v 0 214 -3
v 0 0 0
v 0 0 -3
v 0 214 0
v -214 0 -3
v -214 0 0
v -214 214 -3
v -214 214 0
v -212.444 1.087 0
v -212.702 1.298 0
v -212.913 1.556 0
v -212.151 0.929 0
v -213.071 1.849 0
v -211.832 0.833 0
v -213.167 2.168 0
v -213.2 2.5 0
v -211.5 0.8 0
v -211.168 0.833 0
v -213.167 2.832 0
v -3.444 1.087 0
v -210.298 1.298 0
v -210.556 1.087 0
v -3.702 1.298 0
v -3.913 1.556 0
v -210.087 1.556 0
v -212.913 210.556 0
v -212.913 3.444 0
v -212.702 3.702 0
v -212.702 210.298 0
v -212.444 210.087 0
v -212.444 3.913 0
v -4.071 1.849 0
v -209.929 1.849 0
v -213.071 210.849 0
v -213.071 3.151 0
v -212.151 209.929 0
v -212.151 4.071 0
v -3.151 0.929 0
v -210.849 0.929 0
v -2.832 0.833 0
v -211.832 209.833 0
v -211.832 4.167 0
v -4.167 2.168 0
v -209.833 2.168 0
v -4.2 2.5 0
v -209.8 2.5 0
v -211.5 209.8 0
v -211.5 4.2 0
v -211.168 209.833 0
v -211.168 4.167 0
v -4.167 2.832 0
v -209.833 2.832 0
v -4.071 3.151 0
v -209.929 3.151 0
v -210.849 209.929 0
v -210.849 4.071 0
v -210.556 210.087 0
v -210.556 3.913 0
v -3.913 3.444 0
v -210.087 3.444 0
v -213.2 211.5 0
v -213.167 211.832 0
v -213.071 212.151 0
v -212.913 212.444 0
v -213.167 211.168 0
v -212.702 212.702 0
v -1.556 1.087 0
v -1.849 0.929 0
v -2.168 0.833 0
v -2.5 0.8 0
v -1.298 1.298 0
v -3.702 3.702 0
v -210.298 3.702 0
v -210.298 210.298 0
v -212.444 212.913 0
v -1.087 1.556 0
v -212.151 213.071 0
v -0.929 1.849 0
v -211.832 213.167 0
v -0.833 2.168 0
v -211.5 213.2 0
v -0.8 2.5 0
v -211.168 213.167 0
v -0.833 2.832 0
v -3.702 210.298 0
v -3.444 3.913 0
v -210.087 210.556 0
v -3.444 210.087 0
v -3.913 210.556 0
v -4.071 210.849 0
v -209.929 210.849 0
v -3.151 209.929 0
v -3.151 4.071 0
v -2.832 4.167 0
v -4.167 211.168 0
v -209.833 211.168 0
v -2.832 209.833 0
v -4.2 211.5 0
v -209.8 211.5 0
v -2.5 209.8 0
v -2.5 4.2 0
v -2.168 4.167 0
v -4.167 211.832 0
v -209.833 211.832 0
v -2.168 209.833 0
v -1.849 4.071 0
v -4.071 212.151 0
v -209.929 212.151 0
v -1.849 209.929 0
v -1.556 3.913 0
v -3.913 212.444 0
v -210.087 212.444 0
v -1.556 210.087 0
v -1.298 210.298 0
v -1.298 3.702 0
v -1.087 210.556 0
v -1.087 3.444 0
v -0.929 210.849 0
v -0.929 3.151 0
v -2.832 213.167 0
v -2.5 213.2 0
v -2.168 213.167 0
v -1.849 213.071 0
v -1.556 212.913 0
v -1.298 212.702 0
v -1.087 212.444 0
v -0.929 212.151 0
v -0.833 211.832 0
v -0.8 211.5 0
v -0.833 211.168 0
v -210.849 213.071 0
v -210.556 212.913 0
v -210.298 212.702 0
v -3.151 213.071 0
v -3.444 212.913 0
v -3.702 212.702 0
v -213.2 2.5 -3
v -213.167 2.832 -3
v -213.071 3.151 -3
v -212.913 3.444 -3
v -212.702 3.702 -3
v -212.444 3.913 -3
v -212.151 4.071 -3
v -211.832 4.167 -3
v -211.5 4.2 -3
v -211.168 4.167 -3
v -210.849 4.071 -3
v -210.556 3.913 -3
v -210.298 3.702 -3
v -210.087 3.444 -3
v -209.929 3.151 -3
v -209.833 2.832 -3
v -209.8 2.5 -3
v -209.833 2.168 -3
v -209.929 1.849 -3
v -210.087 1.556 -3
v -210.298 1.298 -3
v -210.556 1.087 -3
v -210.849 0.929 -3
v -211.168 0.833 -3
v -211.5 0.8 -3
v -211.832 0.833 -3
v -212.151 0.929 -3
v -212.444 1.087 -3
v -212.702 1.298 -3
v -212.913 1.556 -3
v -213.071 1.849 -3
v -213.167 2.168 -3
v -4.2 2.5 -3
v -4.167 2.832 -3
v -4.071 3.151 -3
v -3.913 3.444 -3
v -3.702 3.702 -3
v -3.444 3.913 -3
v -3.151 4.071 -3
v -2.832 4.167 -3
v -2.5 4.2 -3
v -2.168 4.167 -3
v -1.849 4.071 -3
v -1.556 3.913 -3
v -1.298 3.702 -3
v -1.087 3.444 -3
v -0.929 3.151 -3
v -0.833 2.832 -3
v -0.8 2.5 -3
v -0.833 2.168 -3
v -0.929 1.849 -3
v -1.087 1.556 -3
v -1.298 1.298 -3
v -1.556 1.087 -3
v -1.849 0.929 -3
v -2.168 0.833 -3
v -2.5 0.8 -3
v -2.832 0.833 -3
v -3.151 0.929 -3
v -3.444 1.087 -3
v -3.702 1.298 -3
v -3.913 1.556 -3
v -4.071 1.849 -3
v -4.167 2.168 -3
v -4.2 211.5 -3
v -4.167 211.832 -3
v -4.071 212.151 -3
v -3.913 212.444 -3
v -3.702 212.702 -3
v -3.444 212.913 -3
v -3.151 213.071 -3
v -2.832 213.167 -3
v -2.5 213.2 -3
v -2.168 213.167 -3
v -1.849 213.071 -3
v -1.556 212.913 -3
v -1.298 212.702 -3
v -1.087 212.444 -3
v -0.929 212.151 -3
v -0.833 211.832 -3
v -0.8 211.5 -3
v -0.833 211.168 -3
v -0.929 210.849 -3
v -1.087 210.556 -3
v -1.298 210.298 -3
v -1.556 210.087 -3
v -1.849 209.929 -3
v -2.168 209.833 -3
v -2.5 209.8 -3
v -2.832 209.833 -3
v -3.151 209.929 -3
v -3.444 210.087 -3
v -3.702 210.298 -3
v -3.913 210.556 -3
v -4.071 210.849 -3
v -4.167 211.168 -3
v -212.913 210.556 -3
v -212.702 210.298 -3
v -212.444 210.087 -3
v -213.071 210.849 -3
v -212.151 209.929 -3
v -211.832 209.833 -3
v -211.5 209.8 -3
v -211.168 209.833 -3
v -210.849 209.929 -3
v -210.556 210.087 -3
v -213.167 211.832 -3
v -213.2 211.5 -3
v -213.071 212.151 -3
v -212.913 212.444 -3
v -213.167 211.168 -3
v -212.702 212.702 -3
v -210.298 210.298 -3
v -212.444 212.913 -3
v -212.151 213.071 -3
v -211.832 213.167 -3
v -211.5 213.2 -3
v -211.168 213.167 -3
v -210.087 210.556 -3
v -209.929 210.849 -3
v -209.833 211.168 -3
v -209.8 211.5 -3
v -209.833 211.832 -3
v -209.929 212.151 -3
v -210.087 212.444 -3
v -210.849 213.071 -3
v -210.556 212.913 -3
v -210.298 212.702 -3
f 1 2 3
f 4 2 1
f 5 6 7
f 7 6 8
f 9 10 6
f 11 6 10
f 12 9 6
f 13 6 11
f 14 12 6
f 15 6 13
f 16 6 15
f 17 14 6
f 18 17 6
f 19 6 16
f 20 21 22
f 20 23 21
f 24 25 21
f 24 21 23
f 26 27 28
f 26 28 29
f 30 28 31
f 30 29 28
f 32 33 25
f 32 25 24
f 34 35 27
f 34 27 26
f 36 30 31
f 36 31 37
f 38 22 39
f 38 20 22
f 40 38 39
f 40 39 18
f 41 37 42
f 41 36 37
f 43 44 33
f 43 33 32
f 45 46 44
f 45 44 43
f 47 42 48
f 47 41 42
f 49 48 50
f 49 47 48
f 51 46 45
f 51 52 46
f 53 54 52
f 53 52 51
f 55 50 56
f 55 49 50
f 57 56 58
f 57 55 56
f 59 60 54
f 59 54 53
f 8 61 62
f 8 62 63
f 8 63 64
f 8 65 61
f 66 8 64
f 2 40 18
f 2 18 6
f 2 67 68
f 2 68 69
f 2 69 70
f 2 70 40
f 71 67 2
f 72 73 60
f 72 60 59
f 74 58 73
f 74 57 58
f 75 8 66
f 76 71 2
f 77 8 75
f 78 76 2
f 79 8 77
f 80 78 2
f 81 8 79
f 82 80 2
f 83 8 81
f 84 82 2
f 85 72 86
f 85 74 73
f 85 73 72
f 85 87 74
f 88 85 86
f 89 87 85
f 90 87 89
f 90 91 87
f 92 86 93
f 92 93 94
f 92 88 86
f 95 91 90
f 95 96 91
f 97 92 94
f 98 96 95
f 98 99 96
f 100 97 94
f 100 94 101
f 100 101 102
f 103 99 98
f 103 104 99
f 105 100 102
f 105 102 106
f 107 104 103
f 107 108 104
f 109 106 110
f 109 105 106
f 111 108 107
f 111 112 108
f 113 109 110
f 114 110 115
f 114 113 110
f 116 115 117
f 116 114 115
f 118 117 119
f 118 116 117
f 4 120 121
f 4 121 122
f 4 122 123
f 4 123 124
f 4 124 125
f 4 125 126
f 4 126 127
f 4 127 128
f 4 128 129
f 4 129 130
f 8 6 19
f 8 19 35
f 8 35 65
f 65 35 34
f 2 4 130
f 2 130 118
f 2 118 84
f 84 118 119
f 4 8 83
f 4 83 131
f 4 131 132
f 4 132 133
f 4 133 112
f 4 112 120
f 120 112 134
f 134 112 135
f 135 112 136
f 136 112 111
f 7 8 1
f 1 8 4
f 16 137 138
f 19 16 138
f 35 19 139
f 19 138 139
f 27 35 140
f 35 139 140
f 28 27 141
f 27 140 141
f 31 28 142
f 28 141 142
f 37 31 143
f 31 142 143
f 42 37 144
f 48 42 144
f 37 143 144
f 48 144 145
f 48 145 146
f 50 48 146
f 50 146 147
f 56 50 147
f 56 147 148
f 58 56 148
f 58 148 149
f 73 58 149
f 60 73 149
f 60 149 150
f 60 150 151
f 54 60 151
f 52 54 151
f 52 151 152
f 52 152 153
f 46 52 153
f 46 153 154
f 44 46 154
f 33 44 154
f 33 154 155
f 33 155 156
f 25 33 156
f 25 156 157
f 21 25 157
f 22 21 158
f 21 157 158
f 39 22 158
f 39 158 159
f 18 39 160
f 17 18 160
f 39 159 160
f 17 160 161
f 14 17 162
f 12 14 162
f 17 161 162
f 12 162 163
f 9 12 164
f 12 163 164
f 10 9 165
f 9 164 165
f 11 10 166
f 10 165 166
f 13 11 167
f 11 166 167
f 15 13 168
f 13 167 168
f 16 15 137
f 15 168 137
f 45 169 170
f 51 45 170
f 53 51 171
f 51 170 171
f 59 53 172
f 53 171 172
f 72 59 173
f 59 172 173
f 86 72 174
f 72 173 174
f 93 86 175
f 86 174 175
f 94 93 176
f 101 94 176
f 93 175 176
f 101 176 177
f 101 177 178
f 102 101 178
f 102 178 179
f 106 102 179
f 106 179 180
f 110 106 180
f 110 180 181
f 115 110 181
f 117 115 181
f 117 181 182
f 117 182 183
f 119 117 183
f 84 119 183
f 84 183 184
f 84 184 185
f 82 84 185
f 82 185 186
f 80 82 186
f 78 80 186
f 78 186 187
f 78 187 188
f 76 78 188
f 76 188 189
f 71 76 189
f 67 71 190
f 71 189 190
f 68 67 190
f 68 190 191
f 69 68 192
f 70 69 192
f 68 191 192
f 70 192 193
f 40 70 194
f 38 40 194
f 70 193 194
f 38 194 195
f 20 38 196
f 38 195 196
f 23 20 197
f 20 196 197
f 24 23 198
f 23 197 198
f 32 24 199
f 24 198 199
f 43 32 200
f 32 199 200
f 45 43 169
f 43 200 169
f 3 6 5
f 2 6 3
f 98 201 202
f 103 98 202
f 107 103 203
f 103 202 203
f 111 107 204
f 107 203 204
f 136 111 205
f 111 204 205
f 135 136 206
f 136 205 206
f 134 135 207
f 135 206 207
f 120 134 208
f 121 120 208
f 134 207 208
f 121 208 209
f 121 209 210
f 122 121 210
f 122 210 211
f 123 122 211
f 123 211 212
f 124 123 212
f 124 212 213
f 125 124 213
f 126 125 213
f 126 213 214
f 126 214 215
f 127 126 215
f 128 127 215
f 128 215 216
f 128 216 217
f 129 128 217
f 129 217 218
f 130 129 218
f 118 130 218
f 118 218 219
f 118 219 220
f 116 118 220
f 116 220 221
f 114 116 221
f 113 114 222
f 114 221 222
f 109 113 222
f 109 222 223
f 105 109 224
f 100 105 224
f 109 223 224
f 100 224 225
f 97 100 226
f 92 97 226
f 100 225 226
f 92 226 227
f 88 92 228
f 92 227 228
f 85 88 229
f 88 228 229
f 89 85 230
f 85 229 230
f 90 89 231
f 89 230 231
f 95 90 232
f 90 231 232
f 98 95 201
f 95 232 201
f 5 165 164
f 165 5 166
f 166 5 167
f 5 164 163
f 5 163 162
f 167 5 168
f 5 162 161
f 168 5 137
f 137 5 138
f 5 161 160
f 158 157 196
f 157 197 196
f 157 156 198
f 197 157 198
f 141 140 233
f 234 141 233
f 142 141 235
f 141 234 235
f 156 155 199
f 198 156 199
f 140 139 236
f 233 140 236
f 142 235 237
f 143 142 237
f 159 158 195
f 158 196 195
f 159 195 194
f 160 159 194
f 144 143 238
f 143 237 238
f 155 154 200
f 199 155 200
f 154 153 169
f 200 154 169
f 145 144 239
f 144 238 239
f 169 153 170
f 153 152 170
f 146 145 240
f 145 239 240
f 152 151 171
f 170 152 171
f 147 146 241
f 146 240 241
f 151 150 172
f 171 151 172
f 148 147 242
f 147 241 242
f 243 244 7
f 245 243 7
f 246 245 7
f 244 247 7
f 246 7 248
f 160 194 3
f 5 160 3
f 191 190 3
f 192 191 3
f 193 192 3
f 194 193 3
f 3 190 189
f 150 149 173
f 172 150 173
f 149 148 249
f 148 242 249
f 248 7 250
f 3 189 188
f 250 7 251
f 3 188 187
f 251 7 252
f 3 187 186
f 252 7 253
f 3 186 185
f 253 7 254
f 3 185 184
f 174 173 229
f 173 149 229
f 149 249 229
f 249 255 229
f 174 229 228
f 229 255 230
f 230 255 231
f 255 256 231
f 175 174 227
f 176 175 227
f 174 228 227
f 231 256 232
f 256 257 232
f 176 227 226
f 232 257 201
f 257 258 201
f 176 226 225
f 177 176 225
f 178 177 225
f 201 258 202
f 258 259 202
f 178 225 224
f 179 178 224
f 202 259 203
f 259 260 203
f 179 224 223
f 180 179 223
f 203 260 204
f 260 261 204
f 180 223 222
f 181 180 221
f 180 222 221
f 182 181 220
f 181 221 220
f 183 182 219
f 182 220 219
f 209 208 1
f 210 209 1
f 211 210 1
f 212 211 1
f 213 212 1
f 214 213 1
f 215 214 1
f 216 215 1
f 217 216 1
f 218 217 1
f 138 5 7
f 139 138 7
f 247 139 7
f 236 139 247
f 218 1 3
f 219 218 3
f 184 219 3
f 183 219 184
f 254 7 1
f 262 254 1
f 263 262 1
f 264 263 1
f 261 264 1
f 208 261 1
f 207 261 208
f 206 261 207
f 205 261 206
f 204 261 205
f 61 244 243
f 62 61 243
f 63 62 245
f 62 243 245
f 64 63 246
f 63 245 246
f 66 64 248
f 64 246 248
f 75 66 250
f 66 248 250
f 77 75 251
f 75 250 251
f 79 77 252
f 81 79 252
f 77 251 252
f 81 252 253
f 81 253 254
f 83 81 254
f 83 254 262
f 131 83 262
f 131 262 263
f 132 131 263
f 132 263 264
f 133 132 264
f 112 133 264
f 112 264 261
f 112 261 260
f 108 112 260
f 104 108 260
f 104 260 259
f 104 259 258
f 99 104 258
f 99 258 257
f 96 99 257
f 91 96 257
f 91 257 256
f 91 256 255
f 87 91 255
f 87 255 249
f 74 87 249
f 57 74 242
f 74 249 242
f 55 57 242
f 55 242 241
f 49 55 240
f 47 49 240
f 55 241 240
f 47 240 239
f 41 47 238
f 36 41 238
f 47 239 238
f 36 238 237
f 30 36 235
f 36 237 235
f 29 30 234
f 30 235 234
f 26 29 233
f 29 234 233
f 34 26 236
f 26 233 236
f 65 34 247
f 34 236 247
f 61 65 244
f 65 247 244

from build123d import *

# Parameters (mm, degrees)
SCHIZZO1_W                   = 214
SCHIZZO1_H                   = 214
ESTRUSIONE_ESTRUSIONE1_DEPTH = 3
FORO_PER_VITE_M3_1_D         = 3.4
FORO_PER_VITE_M3_1_DEPTH     = 3


with BuildPart() as part:
    # Schizzo1 → Estrusione-Estrusione1 (new body)
    with BuildSketch(Plane.XY):
        with Locations((-107, 107)):
            Rectangle(SCHIZZO1_W, SCHIZZO1_H)
    extrude(amount=-ESTRUSIONE_ESTRUSIONE1_DEPTH)

    # Foro per Vite M3-1
    with Locations(Plane.XY):
        with Locations((-2.5, 211.5), (-2.5, 2.5), (-211.5, 211.5), (-211.5, 2.5)):
            Hole(FORO_PER_VITE_M3_1_D / 2, depth=FORO_PER_VITE_M3_1_DEPTH)


solid = part.part
